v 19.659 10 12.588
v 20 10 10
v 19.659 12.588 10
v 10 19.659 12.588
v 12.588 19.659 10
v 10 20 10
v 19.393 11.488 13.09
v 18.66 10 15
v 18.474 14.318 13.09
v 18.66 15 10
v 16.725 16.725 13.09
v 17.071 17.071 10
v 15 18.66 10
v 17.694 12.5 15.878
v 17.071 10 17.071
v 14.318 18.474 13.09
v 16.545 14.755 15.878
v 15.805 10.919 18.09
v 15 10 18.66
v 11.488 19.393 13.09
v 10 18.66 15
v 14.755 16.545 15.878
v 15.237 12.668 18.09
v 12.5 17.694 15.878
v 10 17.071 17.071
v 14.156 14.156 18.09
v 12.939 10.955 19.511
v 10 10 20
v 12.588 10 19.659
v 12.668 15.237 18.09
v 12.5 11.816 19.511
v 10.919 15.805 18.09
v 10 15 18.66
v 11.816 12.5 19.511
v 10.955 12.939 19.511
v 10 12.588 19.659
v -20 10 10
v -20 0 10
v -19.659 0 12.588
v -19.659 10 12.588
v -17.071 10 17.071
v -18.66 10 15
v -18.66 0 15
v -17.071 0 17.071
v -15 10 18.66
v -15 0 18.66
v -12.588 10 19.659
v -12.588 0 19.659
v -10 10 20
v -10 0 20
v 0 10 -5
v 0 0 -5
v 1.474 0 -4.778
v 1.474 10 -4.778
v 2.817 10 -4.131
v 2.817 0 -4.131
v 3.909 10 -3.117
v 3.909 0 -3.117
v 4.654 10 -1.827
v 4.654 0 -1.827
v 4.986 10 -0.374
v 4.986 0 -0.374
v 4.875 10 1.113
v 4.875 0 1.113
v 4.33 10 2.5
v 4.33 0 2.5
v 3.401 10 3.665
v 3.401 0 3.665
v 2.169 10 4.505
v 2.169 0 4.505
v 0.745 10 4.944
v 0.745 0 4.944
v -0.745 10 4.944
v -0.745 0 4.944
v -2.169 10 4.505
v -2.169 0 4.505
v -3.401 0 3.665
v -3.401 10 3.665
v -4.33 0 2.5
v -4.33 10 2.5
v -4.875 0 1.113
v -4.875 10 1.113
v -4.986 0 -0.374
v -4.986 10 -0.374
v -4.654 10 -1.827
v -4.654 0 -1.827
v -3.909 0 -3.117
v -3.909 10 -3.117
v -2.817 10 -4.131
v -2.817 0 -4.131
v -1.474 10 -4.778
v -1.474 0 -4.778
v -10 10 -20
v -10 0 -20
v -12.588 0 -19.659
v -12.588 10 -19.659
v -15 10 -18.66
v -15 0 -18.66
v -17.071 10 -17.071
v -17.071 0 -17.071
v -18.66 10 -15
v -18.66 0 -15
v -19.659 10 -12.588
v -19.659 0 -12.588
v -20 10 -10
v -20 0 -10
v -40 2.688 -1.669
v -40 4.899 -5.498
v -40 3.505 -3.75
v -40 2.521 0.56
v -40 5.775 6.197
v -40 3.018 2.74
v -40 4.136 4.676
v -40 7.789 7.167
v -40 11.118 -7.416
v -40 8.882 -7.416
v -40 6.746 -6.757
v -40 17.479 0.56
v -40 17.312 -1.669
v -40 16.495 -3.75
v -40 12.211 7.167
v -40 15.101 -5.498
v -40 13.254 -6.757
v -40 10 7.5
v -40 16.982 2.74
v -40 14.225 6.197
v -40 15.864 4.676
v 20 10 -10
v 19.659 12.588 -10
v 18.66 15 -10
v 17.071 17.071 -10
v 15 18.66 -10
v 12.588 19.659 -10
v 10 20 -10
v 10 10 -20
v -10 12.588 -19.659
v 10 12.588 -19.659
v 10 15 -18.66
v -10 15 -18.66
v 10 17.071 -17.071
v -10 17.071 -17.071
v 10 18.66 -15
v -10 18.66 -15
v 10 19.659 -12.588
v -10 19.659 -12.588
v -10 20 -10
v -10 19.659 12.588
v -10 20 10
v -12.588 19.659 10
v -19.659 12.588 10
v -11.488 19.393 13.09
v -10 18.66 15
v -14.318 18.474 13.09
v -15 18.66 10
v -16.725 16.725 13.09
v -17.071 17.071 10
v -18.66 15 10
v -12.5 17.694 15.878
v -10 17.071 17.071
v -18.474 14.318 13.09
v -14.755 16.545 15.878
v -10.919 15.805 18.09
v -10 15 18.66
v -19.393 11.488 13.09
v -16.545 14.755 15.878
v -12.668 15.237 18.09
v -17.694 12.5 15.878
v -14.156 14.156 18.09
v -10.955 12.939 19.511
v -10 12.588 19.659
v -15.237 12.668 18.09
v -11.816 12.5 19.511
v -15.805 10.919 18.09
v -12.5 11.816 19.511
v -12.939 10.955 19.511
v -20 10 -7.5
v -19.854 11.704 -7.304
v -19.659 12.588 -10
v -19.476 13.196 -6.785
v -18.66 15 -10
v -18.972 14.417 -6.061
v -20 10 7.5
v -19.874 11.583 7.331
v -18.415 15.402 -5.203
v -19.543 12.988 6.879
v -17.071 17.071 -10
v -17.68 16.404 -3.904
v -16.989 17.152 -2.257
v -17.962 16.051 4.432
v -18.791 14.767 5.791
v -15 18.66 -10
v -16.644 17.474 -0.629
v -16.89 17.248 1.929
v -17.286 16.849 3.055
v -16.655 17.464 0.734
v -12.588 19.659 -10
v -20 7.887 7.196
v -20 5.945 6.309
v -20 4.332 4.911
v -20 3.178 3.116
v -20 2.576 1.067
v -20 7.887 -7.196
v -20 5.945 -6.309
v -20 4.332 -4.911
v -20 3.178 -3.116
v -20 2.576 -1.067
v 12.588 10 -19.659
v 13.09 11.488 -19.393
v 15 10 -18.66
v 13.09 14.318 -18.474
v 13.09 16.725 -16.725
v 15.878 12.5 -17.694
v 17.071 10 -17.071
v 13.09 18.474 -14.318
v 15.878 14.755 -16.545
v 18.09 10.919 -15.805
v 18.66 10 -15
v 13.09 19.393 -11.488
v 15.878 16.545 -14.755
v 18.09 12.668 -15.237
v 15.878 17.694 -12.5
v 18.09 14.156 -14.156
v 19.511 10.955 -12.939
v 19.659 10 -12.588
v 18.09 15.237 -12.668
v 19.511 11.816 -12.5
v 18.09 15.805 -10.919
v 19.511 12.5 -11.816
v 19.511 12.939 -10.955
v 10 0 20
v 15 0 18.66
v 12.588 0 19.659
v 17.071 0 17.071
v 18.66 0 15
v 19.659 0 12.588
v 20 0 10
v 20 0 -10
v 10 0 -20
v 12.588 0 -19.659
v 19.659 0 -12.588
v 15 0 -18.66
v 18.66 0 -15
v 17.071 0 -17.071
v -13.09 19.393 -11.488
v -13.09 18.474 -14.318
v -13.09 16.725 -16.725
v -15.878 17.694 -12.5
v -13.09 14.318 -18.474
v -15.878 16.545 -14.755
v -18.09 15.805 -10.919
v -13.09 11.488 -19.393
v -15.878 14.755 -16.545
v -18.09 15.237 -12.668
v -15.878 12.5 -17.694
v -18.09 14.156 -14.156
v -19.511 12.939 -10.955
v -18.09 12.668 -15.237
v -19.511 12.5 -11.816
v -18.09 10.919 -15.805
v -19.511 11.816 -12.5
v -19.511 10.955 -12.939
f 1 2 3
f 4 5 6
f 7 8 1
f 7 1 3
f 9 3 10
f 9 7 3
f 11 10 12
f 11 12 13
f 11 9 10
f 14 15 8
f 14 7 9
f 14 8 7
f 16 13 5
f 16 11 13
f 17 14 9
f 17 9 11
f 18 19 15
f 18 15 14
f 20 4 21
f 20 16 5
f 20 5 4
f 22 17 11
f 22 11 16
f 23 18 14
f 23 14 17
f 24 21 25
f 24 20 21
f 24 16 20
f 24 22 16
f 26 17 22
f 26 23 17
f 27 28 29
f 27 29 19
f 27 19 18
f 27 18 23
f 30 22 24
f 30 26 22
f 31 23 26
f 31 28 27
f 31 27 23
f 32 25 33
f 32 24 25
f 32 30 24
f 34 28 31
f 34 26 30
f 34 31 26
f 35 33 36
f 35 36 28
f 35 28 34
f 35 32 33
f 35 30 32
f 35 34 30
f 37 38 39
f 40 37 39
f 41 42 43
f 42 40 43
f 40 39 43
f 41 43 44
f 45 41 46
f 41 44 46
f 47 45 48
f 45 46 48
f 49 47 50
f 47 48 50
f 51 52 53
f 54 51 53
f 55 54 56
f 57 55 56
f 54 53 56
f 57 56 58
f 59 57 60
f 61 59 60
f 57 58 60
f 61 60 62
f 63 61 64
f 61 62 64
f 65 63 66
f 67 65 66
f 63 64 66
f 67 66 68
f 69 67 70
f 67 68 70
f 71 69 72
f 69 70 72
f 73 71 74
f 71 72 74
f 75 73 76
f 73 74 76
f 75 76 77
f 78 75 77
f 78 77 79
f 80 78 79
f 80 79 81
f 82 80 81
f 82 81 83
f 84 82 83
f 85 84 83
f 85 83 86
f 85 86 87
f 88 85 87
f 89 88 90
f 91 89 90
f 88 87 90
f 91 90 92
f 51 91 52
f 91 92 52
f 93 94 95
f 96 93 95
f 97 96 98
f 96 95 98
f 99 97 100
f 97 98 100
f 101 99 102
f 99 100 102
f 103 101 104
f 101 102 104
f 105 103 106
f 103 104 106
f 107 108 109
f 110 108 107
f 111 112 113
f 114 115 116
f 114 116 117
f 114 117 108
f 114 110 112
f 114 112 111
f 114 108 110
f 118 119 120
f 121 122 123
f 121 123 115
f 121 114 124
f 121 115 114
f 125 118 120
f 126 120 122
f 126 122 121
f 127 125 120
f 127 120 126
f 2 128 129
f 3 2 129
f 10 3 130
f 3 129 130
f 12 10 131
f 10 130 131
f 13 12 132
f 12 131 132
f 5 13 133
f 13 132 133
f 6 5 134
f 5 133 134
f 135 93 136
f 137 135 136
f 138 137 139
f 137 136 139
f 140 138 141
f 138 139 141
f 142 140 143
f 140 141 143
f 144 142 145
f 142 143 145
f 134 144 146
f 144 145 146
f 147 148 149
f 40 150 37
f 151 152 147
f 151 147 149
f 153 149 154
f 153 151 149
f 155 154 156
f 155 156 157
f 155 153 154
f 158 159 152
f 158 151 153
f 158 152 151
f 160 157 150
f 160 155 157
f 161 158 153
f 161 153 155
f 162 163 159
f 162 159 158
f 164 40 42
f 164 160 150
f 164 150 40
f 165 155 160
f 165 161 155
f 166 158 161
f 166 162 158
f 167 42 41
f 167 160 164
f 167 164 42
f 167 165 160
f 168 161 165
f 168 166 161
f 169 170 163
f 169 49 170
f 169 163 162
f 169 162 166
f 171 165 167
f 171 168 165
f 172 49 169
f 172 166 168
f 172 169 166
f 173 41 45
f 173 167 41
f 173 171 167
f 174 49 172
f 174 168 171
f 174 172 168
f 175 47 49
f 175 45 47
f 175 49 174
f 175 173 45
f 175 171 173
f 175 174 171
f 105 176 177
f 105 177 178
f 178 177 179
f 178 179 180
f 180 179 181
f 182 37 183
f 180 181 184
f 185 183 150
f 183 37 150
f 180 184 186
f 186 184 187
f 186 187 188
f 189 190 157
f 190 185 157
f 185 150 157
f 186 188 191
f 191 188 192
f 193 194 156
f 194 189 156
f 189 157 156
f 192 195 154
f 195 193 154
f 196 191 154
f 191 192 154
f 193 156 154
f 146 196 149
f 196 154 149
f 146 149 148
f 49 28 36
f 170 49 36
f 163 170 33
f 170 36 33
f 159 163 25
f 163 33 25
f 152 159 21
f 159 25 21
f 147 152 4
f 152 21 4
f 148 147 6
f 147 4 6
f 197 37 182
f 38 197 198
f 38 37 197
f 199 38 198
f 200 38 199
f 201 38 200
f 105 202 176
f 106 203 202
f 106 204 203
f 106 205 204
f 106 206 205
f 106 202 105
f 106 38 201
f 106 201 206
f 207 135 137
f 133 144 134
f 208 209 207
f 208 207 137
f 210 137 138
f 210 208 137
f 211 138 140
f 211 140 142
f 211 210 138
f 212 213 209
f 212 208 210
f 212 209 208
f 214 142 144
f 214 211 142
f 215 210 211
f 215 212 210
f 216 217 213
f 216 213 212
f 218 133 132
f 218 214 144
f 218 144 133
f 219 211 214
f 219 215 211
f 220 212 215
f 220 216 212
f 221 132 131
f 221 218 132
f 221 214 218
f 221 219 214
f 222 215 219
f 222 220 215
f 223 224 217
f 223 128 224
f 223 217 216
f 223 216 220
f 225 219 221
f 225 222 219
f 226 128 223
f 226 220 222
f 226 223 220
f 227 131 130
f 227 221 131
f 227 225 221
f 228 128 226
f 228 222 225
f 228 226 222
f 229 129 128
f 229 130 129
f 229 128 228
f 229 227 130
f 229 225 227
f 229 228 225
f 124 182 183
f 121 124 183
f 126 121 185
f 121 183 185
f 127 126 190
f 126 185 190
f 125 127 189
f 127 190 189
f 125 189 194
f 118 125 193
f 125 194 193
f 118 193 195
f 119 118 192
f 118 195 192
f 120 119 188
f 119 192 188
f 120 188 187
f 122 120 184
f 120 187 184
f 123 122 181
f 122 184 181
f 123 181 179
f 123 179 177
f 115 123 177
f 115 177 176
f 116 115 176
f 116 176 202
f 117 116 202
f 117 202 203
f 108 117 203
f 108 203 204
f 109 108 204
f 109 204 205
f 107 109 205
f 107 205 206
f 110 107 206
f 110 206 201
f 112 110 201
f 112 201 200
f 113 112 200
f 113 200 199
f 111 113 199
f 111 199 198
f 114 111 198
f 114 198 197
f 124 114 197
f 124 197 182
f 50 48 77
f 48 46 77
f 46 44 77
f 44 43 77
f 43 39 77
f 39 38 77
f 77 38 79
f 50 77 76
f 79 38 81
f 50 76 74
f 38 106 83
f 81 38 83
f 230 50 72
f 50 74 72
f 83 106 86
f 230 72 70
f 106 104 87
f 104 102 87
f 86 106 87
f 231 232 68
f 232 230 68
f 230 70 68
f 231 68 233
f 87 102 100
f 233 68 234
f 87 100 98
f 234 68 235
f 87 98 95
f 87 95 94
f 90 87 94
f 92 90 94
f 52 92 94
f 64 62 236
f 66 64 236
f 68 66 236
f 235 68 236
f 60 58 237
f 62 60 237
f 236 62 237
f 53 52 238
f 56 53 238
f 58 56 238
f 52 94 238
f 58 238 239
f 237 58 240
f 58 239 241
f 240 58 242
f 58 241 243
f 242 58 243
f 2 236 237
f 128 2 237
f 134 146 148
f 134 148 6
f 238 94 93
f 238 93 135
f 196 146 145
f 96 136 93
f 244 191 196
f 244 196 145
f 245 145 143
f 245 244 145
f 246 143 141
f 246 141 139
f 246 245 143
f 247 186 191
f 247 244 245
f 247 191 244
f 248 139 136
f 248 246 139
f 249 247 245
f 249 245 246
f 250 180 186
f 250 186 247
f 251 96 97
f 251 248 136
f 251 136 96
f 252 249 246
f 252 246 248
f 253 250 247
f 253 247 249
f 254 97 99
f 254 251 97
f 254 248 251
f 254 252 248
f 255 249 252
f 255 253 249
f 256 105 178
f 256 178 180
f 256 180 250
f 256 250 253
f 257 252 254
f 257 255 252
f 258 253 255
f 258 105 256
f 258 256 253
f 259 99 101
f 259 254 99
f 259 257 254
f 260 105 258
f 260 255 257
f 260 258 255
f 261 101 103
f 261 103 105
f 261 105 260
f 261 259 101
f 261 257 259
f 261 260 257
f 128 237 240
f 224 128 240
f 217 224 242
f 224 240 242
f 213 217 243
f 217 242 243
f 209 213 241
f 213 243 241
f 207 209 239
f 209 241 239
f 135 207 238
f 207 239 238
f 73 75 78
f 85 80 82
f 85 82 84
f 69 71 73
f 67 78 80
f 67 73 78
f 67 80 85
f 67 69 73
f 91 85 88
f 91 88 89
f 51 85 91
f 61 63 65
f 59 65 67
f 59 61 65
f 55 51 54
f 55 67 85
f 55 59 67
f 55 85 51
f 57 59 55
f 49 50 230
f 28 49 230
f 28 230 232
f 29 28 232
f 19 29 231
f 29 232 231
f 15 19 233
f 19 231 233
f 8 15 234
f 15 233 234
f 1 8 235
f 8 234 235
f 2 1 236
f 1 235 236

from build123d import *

# Parameters (mm, degrees)
SKETCH1_W           = 40
SKETCH1_H           = 40
BOSS_EXTRUDE1_DEPTH = 20
SKETCH2_R           = 5
CUT_EXTRUDE1_DEPTH  = 10
SKETCH3_R           = 7.5
BOSS_EXTRUDE2_DEPTH = 20
FILLET1_R           = 10


with BuildPart() as part:
    # Sketch1 → Boss-Extrude1 (new body)
    with BuildSketch(Plane(origin=(0, 0, 0), x_dir=(1, 0, 0), z_dir=(0, 1, 0))):
        Rectangle(SKETCH1_W, SKETCH1_H)
    extrude(amount=BOSS_EXTRUDE1_DEPTH)

    # Sketch2 → Cut-Extrude1 (cut)
    with BuildSketch(Plane.XZ):
        with Locations(Location((0, 0, 0), (0, 0, 270))):
            Circle(SKETCH2_R)
    extrude(amount=-CUT_EXTRUDE1_DEPTH, mode=Mode.SUBTRACT)

    # Sketch3 → Boss-Extrude2 (add)
    with BuildSketch(Plane.ZY.offset(20)):
        with Locations((0, 10)):
            Circle(SKETCH3_R)
    extrude(amount=BOSS_EXTRUDE2_DEPTH)

    # Fillet1
    # the kernel refuses this fillet: 10 mm, written as the material it takes off along each edge
    with BuildSketch(Plane(origin=(10, 10, -10), x_dir=(0, 1, 0), z_dir=(1, 0, 0))) as fillet1_piece_1_section:
        Polygon((0, 0), (FILLET1_R, 0), (FILLET1_R, -FILLET1_R), (0, -FILLET1_R), align=None)
    fillet1_piece_1 = extrude(amount=FILLET1_R, mode=Mode.PRIVATE)
    fillet1_piece_1 = fillet1_piece_1 - Plane(origin=(10, 10, -10), x_dir=(0, -0.7071067811865475, 0.7071067811865475), z_dir=(1, 0, 0)) * Sphere(FILLET1_R, mode=Mode.PRIVATE)
    add(fillet1_piece_1, mode=Mode.SUBTRACT)
    with BuildSketch(Plane(origin=(10, 10, 10), x_dir=(1, 0, 0), z_dir=(0, 0, 1))) as fillet1_piece_2_section:
        Polygon((0, 0), (FILLET1_R, 0), (FILLET1_R, FILLET1_R), (0, FILLET1_R), align=None)
    fillet1_piece_2 = extrude(amount=FILLET1_R, mode=Mode.PRIVATE)
    fillet1_piece_2 = fillet1_piece_2 - Plane(origin=(10, 10, 10), x_dir=(-0.7071067811865475, -0.7071067811865475, 0), z_dir=(0, 0, 1)) * Sphere(FILLET1_R, mode=Mode.PRIVATE)
    add(fillet1_piece_2, mode=Mode.SUBTRACT)
    with BuildSketch(Plane(origin=(-10, 10, -10), x_dir=(0, 1, 0), z_dir=(-1, 0, 0))) as fillet1_piece_3_section:
        Polygon((0, 0), (FILLET1_R, 0), (FILLET1_R, FILLET1_R), (0, FILLET1_R), align=None)
    fillet1_piece_3 = extrude(amount=FILLET1_R, mode=Mode.PRIVATE)
    fillet1_piece_3 = fillet1_piece_3 - Plane(origin=(-10, 10, -10), x_dir=(0, -0.7071067811865475, 0.7071067811865475), z_dir=(-1, 0, 0)) * Sphere(FILLET1_R, mode=Mode.PRIVATE)
    add(fillet1_piece_3, mode=Mode.SUBTRACT)
    with BuildSketch(Plane(origin=(-10, 10, 10), x_dir=(-1, 0, 0), z_dir=(0, 0, 1))) as fillet1_piece_4_section:
        Polygon((0, 0), (FILLET1_R, 0), (FILLET1_R, -FILLET1_R), (0, -FILLET1_R), align=None)
    fillet1_piece_4 = extrude(amount=FILLET1_R, mode=Mode.PRIVATE)
    fillet1_piece_4 = fillet1_piece_4 - Plane(origin=(-10, 10, 10), x_dir=(0.7071067811865475, -0.7071067811865475, 0), z_dir=(0, 0, 1)) * Sphere(FILLET1_R, mode=Mode.PRIVATE)
    add(fillet1_piece_4, mode=Mode.SUBTRACT)
    with BuildSketch(Plane(origin=(20, 20, -10), x_dir=(0, -1, 0), z_dir=(0, 0, 1)), Plane(origin=(10, 20, 20), x_dir=(0, -1, 0), z_dir=(-1, 0, 0))) as fillet1_piece_5:
        with BuildLine():
            CenterArc((FILLET1_R, -FILLET1_R), FILLET1_R, 90, 90)
            Line((0, -FILLET1_R), (0, 0))
            Line((0, 0), (FILLET1_R, 0))
        make_face()
    extrude(amount=20, mode=Mode.SUBTRACT)
    with BuildSketch(Plane(origin=(-10, 20, -20), x_dir=(0, 0, 1), z_dir=(1, 0, 0))) as fillet1_piece_6:
        with BuildLine():
            CenterArc((FILLET1_R, FILLET1_R), FILLET1_R, 180, 90)
            Line((0, FILLET1_R), (0, 0))
            Line((0, 0), (FILLET1_R, 0))
        make_face()
    extrude(amount=20, mode=Mode.SUBTRACT)
    with BuildSketch(Plane(origin=(-20, 20, 10), x_dir=(0, -1, 0), z_dir=(0, 0, -1))) as fillet1_piece_7_section:
        with BuildLine():
            CenterArc((FILLET1_R, -FILLET1_R), FILLET1_R, 90, 90)
            Line((0, -FILLET1_R), (0, 0))
            Line((0, 0), (FILLET1_R, 0))
        make_face()
    fillet1_piece_7 = extrude(amount=20, mode=Mode.PRIVATE)
    fillet1_piece_7 = fillet1_piece_7 - Plane(origin=(-17.405135358, 10, 0), x_dir=(0, 0, 1), z_dir=(1, 0, 0)) * Cylinder(7.5, 80, mode=Mode.PRIVATE)
    add(fillet1_piece_7, mode=Mode.SUBTRACT)
    with BuildSketch(Plane(origin=(-20, -25, -20), x_dir=(0, 0, 1), z_dir=(0, 1, 0)), Plane(origin=(-20, -25, 20), x_dir=(1, 0, 0), z_dir=(0, 1, 0))) as fillet1_piece_8:
        with BuildLine():
            CenterArc((FILLET1_R, FILLET1_R), FILLET1_R, 180, 90)
            Line((0, FILLET1_R), (0, 0))
            Line((0, 0), (FILLET1_R, 0))
        make_face()
    extrude(amount=35, mode=Mode.SUBTRACT)
    with BuildSketch(Plane(origin=(20, -25, -20), x_dir=(0, 0, 1), z_dir=(0, 1, 0)), Plane(origin=(20, -25, 20), x_dir=(-1, 0, 0), z_dir=(0, 1, 0))) as fillet1_piece_9:
        with BuildLine():
            CenterArc((FILLET1_R, -FILLET1_R), FILLET1_R, 90, 90)
            Line((0, -FILLET1_R), (0, 0))
            Line((0, 0), (FILLET1_R, 0))
        make_face()
    extrude(amount=35, mode=Mode.SUBTRACT)


solid = part.part
